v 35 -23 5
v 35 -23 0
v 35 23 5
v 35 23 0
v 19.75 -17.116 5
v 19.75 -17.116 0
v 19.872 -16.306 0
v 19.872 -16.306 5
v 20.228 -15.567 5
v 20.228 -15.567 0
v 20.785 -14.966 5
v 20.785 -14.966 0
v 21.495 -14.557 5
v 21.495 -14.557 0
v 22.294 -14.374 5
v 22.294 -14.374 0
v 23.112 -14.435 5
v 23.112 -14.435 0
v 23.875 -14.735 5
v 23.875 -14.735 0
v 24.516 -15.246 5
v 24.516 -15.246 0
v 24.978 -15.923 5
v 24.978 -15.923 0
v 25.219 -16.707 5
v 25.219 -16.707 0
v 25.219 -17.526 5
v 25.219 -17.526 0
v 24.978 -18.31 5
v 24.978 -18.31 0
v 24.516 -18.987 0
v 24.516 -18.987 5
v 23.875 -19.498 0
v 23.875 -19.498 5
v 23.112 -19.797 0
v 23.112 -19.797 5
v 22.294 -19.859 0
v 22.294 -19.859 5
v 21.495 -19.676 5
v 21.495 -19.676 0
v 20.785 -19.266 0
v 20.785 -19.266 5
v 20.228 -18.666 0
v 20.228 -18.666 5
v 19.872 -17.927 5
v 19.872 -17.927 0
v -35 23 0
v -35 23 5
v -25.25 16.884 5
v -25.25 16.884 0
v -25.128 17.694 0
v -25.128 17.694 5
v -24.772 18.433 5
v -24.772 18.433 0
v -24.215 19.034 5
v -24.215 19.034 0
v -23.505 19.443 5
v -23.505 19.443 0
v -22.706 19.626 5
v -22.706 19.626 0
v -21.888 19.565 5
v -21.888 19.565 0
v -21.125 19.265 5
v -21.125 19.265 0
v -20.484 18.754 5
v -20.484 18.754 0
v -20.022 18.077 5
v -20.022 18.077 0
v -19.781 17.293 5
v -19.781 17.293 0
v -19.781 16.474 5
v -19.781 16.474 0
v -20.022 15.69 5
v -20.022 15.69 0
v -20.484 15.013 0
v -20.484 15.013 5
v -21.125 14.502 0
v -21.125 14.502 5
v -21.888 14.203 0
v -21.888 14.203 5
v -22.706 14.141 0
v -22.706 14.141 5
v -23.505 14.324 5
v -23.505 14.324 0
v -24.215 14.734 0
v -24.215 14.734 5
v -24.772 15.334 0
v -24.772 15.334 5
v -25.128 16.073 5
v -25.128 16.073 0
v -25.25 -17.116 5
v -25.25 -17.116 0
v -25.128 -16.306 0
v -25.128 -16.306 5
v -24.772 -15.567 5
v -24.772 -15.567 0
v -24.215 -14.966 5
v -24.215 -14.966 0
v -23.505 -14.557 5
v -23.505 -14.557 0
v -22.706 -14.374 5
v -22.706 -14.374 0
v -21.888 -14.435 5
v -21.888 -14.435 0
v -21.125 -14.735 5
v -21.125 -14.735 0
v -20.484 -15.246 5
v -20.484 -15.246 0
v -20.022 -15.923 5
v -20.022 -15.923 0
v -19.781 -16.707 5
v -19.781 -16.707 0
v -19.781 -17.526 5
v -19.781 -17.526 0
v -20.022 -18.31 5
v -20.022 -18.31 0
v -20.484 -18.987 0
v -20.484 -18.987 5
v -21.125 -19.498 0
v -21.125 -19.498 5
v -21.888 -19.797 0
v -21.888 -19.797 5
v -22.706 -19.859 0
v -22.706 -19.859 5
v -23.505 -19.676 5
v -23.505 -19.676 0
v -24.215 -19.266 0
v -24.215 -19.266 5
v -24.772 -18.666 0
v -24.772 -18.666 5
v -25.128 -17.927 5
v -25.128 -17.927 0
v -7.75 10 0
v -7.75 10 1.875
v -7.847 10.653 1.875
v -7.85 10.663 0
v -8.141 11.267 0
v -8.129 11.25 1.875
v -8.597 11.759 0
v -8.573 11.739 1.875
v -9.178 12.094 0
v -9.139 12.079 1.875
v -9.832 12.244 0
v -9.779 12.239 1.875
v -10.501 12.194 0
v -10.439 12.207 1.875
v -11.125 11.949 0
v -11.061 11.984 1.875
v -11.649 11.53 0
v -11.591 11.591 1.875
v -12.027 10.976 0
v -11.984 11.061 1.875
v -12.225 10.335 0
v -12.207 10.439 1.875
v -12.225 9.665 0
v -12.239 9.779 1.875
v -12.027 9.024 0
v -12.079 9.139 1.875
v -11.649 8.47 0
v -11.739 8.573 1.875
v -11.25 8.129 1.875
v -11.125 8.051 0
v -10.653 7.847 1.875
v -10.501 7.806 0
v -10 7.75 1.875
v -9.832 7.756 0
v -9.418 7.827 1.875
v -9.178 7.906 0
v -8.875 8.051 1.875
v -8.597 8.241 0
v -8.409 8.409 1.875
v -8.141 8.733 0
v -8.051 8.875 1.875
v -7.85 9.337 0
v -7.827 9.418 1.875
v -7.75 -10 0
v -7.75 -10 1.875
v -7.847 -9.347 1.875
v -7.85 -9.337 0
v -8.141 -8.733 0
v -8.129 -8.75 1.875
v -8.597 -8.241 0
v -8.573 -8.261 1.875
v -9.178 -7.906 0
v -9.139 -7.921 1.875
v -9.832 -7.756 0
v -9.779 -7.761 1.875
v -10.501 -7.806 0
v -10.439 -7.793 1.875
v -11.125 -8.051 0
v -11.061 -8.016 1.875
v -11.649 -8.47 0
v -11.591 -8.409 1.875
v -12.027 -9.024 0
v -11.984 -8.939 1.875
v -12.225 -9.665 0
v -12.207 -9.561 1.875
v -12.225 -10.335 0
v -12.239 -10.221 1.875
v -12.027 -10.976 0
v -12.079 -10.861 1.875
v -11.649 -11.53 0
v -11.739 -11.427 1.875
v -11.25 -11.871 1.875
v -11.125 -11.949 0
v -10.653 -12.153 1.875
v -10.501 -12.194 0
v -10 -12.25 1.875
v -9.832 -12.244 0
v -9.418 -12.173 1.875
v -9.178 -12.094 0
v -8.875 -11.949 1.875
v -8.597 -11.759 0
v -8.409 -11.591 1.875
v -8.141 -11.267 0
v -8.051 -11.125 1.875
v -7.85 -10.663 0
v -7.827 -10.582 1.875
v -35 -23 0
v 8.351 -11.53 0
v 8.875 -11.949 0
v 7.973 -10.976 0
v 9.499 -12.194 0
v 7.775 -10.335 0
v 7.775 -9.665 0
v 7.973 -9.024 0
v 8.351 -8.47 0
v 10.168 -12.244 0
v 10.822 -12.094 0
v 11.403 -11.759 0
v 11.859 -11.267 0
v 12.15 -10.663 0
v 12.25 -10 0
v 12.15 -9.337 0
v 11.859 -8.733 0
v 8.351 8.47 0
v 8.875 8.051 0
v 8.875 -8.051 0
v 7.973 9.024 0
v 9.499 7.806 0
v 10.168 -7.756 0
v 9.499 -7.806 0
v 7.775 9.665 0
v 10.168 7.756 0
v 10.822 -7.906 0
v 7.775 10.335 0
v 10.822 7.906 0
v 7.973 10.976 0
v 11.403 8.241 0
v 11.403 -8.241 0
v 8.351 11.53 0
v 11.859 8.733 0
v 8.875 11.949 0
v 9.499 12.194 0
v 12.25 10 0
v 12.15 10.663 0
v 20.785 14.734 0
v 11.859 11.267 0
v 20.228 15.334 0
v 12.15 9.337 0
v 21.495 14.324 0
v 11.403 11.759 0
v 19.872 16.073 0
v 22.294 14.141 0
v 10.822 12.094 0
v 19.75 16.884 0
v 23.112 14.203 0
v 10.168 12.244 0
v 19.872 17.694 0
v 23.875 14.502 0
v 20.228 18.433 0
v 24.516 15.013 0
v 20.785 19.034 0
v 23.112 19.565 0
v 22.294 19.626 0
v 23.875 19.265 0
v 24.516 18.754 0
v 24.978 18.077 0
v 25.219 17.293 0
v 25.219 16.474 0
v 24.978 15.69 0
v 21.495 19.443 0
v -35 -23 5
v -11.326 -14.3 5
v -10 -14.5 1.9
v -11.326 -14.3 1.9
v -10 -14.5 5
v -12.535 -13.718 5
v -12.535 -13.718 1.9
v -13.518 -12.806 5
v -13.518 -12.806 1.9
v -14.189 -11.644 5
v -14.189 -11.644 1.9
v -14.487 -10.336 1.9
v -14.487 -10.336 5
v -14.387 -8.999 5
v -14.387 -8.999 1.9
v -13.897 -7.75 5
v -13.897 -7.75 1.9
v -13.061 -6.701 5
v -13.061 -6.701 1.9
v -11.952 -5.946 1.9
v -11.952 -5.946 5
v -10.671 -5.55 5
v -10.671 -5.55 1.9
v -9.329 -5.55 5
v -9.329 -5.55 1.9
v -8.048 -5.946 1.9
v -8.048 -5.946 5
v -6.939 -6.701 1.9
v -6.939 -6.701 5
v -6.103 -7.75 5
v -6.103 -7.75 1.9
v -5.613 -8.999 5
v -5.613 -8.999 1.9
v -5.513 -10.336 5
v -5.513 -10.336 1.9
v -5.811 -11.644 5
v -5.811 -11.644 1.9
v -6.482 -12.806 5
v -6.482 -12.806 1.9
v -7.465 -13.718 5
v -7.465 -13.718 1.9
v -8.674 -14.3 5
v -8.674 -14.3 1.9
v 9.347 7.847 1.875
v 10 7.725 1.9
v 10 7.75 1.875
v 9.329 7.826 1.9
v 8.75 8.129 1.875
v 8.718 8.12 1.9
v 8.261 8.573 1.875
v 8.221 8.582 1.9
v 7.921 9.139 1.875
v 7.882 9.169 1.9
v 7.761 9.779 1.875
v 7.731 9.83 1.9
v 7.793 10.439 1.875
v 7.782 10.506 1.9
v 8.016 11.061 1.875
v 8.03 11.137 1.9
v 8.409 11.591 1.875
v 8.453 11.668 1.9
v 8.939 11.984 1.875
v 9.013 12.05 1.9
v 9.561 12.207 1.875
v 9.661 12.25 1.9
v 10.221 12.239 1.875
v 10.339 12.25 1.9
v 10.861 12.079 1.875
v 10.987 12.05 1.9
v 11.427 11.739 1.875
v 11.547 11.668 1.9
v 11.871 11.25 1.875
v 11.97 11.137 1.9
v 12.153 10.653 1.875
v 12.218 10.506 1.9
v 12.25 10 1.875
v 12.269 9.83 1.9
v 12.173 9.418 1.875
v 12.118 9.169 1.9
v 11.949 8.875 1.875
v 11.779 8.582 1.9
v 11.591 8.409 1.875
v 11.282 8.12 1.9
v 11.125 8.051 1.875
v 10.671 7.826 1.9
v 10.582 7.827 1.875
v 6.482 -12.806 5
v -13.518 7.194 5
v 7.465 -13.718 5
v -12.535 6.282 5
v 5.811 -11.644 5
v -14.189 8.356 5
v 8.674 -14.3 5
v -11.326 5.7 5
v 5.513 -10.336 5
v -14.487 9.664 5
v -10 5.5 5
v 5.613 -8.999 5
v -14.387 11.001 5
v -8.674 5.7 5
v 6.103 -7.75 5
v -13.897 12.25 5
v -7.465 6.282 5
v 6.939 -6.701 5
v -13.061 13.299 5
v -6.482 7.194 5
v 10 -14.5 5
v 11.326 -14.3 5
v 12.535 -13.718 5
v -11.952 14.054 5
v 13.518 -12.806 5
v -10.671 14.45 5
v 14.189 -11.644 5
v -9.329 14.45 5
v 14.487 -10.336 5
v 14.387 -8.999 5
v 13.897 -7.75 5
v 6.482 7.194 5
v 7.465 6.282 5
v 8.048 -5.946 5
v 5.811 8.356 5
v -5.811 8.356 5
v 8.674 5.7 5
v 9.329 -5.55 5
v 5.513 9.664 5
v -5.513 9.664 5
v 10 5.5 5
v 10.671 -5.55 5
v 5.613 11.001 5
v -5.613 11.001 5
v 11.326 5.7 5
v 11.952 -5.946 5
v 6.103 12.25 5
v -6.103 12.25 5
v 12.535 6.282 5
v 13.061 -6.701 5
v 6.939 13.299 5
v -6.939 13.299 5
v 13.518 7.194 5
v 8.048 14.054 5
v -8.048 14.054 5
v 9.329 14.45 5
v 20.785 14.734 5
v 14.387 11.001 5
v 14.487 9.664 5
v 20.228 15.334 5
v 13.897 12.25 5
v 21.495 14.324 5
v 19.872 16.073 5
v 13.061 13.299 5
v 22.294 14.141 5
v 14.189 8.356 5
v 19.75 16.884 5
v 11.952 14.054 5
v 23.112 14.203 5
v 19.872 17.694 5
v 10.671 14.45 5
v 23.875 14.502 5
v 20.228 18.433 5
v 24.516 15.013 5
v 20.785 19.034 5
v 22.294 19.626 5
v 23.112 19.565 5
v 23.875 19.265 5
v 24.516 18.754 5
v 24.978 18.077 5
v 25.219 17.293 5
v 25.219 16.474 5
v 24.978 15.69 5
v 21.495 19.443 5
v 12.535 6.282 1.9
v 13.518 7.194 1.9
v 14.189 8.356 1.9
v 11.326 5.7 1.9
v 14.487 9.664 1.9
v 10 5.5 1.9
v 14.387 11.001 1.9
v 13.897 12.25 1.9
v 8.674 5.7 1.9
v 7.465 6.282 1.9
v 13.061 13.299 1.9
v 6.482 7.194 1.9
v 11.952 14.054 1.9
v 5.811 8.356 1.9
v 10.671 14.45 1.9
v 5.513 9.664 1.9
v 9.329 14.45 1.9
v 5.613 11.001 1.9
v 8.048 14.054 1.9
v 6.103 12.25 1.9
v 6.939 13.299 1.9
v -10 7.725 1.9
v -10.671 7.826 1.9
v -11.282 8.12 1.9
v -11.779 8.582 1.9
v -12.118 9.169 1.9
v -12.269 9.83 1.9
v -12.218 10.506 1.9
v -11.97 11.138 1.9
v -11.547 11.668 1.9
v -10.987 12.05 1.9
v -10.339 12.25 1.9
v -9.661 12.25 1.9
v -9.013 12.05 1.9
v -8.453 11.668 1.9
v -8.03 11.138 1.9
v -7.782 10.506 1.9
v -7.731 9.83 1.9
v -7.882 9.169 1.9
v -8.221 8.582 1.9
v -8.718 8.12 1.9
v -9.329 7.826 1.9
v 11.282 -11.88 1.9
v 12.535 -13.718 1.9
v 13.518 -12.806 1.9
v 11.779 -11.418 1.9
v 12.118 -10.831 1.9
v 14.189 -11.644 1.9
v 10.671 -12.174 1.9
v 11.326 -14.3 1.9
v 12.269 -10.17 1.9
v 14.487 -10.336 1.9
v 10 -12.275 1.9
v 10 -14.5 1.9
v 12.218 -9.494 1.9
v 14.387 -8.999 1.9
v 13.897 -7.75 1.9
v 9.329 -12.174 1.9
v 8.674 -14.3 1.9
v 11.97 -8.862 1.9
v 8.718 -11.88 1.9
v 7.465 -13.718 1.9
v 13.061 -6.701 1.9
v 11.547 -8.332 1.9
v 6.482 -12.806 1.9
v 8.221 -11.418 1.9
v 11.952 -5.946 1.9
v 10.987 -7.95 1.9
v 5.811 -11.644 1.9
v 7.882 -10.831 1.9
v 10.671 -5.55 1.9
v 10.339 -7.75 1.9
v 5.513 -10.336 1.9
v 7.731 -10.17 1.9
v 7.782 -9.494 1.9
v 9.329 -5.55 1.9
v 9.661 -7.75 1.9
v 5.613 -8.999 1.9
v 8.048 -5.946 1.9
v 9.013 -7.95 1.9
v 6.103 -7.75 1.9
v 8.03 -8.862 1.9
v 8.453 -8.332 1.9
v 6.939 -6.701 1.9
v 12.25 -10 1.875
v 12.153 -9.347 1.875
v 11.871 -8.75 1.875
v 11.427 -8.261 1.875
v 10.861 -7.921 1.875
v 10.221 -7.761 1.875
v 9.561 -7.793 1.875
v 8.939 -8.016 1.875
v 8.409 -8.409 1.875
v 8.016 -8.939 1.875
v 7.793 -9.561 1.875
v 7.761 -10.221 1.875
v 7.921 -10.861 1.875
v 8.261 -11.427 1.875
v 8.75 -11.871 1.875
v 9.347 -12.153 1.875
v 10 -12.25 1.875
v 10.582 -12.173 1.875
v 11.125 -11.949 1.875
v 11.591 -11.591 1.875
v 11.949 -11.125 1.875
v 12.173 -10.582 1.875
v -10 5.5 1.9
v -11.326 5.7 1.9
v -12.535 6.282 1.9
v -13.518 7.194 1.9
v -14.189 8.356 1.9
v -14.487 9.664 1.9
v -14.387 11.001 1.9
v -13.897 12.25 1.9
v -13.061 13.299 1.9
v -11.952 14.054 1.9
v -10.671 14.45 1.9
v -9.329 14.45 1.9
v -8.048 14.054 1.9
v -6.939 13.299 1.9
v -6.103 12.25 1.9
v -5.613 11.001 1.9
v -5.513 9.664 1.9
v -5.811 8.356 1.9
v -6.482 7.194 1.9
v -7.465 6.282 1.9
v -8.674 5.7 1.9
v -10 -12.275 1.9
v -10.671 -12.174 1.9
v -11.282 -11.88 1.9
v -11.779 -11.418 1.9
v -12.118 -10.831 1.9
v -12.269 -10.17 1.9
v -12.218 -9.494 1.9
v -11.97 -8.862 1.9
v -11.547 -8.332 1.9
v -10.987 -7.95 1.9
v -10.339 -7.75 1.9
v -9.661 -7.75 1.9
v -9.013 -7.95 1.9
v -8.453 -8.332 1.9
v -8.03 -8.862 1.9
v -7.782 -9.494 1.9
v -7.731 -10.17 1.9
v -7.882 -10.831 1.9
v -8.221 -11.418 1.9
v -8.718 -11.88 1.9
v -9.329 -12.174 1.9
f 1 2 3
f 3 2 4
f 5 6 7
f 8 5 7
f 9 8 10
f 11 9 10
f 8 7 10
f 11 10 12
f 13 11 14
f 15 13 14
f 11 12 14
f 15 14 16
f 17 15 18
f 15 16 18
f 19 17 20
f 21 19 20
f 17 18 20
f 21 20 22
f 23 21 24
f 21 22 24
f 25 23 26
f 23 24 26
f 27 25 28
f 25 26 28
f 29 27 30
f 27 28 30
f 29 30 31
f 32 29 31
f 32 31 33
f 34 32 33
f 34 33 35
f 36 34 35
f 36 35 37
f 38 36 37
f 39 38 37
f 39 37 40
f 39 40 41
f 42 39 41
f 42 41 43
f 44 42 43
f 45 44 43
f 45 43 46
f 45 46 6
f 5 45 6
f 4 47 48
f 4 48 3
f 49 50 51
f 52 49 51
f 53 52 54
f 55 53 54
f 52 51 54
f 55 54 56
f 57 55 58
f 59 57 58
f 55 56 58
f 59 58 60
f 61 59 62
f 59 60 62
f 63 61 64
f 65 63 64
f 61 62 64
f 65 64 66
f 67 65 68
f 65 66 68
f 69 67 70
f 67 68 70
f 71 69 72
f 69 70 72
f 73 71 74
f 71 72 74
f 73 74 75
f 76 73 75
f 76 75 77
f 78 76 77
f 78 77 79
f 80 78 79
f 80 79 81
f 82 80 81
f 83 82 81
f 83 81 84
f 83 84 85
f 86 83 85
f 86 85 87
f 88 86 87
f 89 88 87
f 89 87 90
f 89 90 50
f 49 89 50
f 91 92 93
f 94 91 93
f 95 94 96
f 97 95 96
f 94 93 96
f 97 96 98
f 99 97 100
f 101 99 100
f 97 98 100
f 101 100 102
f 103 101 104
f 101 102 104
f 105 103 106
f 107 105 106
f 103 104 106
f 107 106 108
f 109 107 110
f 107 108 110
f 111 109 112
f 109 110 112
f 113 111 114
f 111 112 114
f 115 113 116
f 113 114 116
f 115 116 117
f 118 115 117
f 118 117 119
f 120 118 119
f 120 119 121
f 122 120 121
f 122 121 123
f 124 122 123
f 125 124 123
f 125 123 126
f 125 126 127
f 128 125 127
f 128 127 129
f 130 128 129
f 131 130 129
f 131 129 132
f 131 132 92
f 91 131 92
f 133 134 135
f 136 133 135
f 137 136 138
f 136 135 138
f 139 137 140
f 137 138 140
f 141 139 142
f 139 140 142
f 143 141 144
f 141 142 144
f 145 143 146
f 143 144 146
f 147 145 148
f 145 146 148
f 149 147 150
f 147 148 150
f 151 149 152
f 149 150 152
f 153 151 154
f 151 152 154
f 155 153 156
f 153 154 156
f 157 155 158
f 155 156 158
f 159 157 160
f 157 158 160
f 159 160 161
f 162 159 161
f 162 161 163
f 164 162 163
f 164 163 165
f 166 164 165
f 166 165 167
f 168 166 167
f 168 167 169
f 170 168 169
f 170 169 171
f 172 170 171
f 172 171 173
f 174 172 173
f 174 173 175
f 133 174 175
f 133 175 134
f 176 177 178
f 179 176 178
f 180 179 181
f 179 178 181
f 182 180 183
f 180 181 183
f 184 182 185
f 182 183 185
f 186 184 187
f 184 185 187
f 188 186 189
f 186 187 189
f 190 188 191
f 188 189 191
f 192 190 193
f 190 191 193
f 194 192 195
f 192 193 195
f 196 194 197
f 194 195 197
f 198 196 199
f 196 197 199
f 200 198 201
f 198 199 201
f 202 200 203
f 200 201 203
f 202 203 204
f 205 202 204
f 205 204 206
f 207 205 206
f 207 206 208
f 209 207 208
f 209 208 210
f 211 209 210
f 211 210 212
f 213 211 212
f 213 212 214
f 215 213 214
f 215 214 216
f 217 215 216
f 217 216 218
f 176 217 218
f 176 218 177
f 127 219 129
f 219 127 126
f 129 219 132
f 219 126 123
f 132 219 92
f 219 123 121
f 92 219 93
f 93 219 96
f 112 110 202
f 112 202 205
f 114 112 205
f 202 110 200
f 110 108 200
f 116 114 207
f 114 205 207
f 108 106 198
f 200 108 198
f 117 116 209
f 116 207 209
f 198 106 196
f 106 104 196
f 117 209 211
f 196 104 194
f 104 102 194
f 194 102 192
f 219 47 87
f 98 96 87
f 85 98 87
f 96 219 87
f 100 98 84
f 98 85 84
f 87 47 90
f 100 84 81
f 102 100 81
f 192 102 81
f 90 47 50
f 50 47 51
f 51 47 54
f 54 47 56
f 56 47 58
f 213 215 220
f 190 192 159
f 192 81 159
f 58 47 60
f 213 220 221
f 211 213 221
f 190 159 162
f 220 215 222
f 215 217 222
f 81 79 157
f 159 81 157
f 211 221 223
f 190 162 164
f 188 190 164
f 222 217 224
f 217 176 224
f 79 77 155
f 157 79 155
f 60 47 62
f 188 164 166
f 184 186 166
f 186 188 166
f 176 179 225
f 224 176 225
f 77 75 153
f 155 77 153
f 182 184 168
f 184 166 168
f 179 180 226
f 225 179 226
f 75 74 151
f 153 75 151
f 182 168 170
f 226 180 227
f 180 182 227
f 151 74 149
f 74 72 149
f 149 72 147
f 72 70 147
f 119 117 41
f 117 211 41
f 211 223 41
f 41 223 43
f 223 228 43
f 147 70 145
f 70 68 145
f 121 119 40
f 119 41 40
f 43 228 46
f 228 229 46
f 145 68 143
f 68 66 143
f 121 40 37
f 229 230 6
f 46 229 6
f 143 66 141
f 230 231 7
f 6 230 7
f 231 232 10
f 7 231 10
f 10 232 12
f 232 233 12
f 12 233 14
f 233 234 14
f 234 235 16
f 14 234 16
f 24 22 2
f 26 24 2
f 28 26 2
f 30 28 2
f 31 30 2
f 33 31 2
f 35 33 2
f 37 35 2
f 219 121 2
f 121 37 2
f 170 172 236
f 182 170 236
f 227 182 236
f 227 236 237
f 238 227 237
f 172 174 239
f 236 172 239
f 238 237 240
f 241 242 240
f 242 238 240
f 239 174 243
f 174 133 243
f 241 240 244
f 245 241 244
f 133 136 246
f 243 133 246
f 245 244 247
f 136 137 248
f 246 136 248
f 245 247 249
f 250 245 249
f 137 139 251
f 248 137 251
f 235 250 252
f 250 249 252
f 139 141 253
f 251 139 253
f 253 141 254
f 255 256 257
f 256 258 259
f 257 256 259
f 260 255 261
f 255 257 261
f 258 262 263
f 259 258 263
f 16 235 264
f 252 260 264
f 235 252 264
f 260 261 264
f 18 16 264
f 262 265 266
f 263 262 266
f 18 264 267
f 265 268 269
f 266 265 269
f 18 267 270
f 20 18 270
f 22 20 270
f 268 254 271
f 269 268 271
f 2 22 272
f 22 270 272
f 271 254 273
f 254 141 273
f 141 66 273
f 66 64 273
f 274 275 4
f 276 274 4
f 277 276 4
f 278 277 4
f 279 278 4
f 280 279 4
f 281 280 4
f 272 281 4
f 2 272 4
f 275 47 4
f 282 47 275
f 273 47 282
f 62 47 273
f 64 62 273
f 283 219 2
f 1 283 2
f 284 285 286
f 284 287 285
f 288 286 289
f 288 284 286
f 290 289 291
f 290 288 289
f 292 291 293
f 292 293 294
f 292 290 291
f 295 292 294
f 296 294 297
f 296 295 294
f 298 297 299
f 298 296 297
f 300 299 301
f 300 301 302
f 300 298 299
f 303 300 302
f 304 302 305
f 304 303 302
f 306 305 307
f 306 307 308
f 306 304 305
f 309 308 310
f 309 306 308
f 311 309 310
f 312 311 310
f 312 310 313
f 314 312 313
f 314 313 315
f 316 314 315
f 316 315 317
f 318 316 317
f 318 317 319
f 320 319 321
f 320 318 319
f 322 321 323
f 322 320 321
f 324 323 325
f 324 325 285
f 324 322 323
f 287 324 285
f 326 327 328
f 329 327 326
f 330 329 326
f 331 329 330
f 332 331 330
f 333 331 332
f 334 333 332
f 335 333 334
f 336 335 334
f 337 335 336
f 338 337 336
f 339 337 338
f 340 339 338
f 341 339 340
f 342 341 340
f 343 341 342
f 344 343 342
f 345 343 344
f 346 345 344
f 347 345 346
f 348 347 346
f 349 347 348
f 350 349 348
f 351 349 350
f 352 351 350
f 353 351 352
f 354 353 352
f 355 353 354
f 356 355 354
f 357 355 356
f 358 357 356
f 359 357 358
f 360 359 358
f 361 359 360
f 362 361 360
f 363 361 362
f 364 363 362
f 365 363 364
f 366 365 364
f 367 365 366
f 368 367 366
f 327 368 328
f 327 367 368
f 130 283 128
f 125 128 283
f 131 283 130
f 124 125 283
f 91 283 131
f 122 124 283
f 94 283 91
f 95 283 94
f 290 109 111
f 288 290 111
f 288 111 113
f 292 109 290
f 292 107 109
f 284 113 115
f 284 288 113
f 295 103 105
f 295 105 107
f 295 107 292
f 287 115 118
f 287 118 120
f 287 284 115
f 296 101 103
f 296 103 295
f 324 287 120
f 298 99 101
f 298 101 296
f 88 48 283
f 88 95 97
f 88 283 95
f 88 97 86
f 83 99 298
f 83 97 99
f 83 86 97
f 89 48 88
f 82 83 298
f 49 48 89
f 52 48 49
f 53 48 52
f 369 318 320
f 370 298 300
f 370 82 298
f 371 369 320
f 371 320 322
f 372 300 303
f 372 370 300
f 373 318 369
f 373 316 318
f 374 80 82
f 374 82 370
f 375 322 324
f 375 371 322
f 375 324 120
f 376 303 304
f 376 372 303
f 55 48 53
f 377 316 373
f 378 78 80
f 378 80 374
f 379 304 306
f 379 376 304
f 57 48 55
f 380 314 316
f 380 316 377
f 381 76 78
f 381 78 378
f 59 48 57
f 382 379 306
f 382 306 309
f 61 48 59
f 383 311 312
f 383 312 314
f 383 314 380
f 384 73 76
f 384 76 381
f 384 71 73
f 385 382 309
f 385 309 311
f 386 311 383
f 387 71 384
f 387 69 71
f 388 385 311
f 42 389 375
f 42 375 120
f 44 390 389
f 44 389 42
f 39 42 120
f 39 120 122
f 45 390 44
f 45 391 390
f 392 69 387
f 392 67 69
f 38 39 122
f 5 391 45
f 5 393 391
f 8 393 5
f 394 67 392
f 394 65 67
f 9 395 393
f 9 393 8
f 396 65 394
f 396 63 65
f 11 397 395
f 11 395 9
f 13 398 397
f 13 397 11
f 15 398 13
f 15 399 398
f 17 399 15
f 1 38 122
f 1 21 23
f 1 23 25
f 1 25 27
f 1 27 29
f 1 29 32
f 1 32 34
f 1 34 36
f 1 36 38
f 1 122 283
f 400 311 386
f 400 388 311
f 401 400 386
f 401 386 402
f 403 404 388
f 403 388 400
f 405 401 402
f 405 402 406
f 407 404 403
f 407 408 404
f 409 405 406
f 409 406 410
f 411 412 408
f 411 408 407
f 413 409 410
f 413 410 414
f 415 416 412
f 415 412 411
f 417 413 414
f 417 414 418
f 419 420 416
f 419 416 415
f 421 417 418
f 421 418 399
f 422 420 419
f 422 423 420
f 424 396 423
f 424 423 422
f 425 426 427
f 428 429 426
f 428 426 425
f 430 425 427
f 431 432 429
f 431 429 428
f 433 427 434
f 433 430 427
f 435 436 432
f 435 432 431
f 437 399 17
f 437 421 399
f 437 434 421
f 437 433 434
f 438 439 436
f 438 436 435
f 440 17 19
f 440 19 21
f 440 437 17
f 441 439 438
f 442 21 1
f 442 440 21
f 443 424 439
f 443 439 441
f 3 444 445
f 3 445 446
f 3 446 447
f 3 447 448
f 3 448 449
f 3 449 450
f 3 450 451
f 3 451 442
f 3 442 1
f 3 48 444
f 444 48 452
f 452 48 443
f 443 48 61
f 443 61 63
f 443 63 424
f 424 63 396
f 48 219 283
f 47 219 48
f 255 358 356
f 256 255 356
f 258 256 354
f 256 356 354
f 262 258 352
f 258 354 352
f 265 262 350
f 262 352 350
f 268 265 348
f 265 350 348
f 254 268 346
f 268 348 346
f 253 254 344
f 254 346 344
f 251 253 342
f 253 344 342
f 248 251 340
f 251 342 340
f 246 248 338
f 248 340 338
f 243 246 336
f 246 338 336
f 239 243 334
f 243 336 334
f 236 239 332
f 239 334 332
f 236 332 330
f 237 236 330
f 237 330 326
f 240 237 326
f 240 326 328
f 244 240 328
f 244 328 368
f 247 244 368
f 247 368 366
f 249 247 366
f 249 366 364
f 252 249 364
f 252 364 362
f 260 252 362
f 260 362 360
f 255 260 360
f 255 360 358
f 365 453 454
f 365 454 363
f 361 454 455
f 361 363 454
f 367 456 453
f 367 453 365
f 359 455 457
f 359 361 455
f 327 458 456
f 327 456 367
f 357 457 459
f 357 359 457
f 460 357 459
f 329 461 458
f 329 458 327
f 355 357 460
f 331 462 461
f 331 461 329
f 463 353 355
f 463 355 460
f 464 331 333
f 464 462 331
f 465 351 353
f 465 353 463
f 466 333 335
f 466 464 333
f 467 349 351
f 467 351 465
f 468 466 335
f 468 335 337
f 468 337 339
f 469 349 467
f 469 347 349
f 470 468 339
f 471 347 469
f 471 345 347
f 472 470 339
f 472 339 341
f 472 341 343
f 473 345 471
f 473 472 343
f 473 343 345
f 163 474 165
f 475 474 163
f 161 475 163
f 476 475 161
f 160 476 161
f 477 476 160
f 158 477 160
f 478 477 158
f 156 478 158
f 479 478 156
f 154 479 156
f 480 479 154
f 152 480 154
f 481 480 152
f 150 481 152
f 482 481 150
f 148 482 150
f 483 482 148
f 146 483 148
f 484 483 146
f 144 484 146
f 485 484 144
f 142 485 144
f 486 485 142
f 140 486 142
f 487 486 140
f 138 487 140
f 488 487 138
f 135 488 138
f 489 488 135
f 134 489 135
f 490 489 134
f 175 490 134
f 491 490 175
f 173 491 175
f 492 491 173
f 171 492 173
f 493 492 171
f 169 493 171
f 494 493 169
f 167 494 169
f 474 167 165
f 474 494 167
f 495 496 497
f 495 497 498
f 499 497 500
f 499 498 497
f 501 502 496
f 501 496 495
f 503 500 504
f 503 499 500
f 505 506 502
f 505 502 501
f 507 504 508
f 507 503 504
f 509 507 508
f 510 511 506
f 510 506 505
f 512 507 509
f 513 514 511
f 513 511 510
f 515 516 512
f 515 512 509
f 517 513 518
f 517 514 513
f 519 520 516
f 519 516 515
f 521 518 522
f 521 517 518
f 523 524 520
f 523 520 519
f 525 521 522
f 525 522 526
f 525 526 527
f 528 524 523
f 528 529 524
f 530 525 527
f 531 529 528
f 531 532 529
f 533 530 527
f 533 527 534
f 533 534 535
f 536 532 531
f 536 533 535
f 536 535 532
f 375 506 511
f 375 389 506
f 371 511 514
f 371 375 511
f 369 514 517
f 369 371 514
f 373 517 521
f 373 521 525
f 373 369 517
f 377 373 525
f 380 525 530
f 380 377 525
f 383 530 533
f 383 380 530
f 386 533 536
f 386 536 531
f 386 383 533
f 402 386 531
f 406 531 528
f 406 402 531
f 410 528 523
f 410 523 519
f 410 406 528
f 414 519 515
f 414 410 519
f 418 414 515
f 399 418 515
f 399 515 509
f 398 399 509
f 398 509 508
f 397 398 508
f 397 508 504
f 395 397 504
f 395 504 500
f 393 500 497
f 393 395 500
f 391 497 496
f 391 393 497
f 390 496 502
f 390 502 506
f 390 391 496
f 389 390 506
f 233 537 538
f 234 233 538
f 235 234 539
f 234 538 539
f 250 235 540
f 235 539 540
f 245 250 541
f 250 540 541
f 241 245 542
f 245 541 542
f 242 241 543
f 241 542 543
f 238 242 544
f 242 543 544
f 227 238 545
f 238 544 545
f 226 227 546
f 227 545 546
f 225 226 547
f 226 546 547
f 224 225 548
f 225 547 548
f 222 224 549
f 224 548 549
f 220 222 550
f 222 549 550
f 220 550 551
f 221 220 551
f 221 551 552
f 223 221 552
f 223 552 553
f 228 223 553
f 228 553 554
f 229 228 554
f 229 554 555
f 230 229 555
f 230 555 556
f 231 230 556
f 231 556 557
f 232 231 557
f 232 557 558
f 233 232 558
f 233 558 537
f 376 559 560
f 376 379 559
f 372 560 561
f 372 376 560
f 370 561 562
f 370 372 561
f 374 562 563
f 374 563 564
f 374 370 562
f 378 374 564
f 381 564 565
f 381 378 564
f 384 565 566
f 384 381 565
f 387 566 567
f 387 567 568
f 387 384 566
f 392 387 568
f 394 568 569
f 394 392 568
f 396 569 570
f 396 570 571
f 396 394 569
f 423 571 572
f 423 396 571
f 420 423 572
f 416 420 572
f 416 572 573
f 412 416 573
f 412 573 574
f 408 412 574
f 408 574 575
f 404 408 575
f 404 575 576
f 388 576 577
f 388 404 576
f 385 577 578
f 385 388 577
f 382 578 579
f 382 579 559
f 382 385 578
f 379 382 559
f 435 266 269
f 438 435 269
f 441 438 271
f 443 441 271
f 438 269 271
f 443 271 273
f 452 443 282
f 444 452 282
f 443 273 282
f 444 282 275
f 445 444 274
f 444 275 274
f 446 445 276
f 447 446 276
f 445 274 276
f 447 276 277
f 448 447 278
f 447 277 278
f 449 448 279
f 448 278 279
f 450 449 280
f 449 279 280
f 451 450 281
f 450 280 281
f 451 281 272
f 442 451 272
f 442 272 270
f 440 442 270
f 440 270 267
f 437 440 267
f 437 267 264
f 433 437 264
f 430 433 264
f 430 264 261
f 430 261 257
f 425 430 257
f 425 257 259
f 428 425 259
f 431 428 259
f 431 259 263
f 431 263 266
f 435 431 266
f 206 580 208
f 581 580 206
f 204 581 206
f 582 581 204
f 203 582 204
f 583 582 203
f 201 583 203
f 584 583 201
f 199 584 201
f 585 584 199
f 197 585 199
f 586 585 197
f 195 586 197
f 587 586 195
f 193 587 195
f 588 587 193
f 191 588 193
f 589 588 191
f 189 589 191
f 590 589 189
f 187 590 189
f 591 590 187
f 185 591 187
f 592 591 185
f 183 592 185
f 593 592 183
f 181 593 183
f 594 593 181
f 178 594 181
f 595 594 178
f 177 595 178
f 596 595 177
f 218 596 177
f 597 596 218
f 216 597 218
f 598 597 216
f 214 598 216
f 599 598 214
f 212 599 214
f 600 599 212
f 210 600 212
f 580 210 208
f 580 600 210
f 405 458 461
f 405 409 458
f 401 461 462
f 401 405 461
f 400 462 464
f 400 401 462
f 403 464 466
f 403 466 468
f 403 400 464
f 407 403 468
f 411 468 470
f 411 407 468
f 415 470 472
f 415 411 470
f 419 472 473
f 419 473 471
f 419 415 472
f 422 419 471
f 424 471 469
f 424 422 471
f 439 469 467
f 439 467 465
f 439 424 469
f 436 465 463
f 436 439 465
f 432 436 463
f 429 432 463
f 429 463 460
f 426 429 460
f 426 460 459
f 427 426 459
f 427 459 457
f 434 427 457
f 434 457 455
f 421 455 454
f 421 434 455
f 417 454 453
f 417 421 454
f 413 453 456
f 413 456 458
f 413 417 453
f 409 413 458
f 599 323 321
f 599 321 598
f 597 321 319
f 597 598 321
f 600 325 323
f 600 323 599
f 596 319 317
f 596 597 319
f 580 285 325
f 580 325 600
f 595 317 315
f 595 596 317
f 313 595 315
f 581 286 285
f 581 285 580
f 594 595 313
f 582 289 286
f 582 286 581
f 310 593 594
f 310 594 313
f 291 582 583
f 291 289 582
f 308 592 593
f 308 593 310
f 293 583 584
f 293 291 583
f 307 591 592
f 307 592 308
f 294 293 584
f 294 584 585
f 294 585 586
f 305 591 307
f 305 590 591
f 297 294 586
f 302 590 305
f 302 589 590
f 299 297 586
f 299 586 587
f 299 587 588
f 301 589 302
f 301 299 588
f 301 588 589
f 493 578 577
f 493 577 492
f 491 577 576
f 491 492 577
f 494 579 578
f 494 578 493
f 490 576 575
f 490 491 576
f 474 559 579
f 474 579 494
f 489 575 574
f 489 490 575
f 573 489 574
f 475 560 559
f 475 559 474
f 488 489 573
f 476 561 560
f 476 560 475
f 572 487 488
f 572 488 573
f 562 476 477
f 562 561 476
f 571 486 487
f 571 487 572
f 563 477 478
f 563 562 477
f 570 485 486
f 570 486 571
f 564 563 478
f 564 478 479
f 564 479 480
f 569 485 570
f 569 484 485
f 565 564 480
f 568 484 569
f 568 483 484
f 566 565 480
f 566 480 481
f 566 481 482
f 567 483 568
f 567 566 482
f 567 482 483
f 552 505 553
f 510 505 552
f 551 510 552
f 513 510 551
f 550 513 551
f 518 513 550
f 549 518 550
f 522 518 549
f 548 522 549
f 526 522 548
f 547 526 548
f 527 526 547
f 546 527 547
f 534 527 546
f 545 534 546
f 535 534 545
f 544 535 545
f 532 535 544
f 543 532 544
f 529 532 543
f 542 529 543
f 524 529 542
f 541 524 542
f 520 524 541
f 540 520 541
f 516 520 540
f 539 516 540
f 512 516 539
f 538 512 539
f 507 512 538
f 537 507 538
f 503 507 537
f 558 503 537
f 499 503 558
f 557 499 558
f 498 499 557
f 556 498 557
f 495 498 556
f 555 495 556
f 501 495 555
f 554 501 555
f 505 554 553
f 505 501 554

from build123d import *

# Parameters (mm, degrees)
ESQUISSE1_W                                = 70
ESQUISSE1_H                                = 46
BOSS_EXTRU_1_DEPTH                         = 5
D_GAGEMENT_M51_D                           = 5.5
D_GAGEMENT_M41_D                           = 4.5
CHAMBRAGE_POUR_VIS_T_TE_RONDE_BOMB_2_COUNT = 2
CHAMBRAGE_POUR_VIS_T_TE_RONDE_BOMB_2_PITCH = 20
CHAMBRAGE_POUR_VIS_T_TE_RONDE_BOMB_3_COUNT = 2
CHAMBRAGE_POUR_VIS_T_TE_RONDE_BOMB_3_PITCH = 28.284271247
CHAMBRAGE_POUR_VIS_T_TE_RONDE_BOMB_4_COUNT = 2
CHAMBRAGE_POUR_VIS_T_TE_RONDE_BOMB_4_PITCH = 20


with BuildPart() as part:
    # Esquisse1 → Boss.-Extru.1 (new body)
    with BuildSketch(Plane.XY):
        Rectangle(ESQUISSE1_W, ESQUISSE1_H)
    extrude(amount=BOSS_EXTRU_1_DEPTH)

    # Dégagement M51 (through all)
    with Locations(Plane.XY.offset(5)):
        with Locations((22.5, -17.116426572), (22.5, 16.883573428), (-22.5, 16.883573428), (-22.5, -17.116426572)):
            Hole(D_GAGEMENT_M51_D / 2)

    # Dégagement M41 (through all)
    with Locations(Plane(origin=(0, 0, 0), x_dir=(-1, 0, 0), z_dir=(0, 0, -1))):
        with Locations((10, -10), (-10, -10), (-10, 10), (10, 10)):
            Hole(D_GAGEMENT_M41_D / 2)

    # Esquisse6 → Chambrage pour vis à tête ronde bombée M41 (revolve, cut)
    with BuildSketch(Plane(origin=(-10, -10, 5), x_dir=(0, -1, 0), z_dir=(1, 0, 0))):
        Polygon((0, 0), (0, 5), (2.25, 5), (2.25, 3.125), (2.275, 3.1), (4.5, 3.1), (4.5, 0), align=None)
    chambrage_pour_vis_t_te_ronde_bomb_e_m = revolve(axis=Axis((-10, -10, 11.35), (0, 0, -1)), mode=Mode.SUBTRACT)

    # Chambrage pour vis _ t_te ronde bomb 2: Chambrage pour vis à tête ronde bombée M41 ×2
    with Locations(*[(0, i * CHAMBRAGE_POUR_VIS_T_TE_RONDE_BOMB_2_PITCH, 0) for i in range(1, CHAMBRAGE_POUR_VIS_T_TE_RONDE_BOMB_2_COUNT)]):
        add(chambrage_pour_vis_t_te_ronde_bomb_e_m, mode=Mode.SUBTRACT)

    # Chambrage pour vis _ t_te ronde bomb 3: Chambrage pour vis à tête ronde bombée M41 ×2
    with Locations(*[Vector(0.7071067811865407, 0.7071067811865545, 0) * (i * CHAMBRAGE_POUR_VIS_T_TE_RONDE_BOMB_3_PITCH) for i in range(1, CHAMBRAGE_POUR_VIS_T_TE_RONDE_BOMB_3_COUNT)]):
        add(chambrage_pour_vis_t_te_ronde_bomb_e_m, mode=Mode.SUBTRACT)

    # Chambrage pour vis _ t_te ronde bomb 4: Chambrage pour vis à tête ronde bombée M41 ×2
    with Locations(*[(i * CHAMBRAGE_POUR_VIS_T_TE_RONDE_BOMB_4_PITCH, 0, 0) for i in range(1, CHAMBRAGE_POUR_VIS_T_TE_RONDE_BOMB_4_COUNT)]):
        add(chambrage_pour_vis_t_te_ronde_bomb_e_m, mode=Mode.SUBTRACT)


solid = part.part
